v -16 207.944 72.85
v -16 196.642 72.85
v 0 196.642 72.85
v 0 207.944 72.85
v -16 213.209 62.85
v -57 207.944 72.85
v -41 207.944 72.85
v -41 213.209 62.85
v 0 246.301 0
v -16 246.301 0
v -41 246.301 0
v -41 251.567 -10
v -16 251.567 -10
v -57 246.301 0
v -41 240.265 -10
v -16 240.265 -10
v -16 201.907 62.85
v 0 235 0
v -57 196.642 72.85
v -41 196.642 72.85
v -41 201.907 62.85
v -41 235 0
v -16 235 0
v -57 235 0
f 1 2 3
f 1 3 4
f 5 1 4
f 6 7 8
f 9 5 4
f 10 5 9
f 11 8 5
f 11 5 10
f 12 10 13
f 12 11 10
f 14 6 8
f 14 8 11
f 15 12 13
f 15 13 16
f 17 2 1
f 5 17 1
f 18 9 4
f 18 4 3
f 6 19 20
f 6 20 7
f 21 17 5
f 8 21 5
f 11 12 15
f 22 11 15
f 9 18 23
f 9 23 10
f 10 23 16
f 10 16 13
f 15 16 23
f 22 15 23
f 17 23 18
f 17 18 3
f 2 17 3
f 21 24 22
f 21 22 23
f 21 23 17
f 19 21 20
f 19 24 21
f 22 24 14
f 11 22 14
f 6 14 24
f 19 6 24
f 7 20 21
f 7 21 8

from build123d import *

# Parameters (mm, degrees)
PAD050_DEPTH            = 57
POCKET044_DEPTH         = 16
POCKET046_DEPTH         = 16
SKETCH090_W             = 20
SKETCH090_H             = 25
POCKET045_DEPTH         = 10
BODY022_PLACEMENT_ANGLE = 180


with BuildPart() as part:
    # Sketch092 → Pad050 (new body)
    with BuildSketch(Plane.YZ):
        Polygon((54.734671, -10), (98.357923, 72.85), (87.056432, 72.85), (43.43318, -10), align=None)
    extrude(amount=-PAD050_DEPTH)

    # Sketch089 (on Face5 of Pad050) → Pocket044 (cut)
    with BuildSketch(Plane.YZ):
        Polygon((43.43318, -10), (54.734671, -10), (60, 0), (48.698509, 0), align=None)
    extrude(amount=-POCKET044_DEPTH, mode=Mode.SUBTRACT)

    # Sketch094 (on Face6 of Pocket044) → Pocket046 (cut)
    with BuildSketch(Plane(origin=(-57, 0, 0), x_dir=(0, 1, 0), z_dir=(-1, 0, 0))):
        Polygon((43.43318, 10), (54.734671, 10), (60, 0), (48.698509, 0), align=None)
    extrude(amount=-POCKET046_DEPTH, mode=Mode.SUBTRACT)

    # Sketch090 (on Face5 of Pocket046) → Pocket045 (cut)
    with BuildSketch(Plane(origin=(0, 0, 72.85), x_dir=(0, -1, 0), z_dir=(0, 0, 1))):
        with Locations((-88.357923, -28.5)):
            Rectangle(SKETCH090_W, SKETCH090_H)
    extrude(amount=-POCKET045_DEPTH, mode=Mode.SUBTRACT)


with BuildPart() as part_1:
    # Body022 placement: moved
    add(part.part.moved(Location((-57, 295, 0))).rotate(Axis((-57, 295, 0), (0, 0, 1)), BODY022_PLACEMENT_ANGLE))


solid = part_1.part
